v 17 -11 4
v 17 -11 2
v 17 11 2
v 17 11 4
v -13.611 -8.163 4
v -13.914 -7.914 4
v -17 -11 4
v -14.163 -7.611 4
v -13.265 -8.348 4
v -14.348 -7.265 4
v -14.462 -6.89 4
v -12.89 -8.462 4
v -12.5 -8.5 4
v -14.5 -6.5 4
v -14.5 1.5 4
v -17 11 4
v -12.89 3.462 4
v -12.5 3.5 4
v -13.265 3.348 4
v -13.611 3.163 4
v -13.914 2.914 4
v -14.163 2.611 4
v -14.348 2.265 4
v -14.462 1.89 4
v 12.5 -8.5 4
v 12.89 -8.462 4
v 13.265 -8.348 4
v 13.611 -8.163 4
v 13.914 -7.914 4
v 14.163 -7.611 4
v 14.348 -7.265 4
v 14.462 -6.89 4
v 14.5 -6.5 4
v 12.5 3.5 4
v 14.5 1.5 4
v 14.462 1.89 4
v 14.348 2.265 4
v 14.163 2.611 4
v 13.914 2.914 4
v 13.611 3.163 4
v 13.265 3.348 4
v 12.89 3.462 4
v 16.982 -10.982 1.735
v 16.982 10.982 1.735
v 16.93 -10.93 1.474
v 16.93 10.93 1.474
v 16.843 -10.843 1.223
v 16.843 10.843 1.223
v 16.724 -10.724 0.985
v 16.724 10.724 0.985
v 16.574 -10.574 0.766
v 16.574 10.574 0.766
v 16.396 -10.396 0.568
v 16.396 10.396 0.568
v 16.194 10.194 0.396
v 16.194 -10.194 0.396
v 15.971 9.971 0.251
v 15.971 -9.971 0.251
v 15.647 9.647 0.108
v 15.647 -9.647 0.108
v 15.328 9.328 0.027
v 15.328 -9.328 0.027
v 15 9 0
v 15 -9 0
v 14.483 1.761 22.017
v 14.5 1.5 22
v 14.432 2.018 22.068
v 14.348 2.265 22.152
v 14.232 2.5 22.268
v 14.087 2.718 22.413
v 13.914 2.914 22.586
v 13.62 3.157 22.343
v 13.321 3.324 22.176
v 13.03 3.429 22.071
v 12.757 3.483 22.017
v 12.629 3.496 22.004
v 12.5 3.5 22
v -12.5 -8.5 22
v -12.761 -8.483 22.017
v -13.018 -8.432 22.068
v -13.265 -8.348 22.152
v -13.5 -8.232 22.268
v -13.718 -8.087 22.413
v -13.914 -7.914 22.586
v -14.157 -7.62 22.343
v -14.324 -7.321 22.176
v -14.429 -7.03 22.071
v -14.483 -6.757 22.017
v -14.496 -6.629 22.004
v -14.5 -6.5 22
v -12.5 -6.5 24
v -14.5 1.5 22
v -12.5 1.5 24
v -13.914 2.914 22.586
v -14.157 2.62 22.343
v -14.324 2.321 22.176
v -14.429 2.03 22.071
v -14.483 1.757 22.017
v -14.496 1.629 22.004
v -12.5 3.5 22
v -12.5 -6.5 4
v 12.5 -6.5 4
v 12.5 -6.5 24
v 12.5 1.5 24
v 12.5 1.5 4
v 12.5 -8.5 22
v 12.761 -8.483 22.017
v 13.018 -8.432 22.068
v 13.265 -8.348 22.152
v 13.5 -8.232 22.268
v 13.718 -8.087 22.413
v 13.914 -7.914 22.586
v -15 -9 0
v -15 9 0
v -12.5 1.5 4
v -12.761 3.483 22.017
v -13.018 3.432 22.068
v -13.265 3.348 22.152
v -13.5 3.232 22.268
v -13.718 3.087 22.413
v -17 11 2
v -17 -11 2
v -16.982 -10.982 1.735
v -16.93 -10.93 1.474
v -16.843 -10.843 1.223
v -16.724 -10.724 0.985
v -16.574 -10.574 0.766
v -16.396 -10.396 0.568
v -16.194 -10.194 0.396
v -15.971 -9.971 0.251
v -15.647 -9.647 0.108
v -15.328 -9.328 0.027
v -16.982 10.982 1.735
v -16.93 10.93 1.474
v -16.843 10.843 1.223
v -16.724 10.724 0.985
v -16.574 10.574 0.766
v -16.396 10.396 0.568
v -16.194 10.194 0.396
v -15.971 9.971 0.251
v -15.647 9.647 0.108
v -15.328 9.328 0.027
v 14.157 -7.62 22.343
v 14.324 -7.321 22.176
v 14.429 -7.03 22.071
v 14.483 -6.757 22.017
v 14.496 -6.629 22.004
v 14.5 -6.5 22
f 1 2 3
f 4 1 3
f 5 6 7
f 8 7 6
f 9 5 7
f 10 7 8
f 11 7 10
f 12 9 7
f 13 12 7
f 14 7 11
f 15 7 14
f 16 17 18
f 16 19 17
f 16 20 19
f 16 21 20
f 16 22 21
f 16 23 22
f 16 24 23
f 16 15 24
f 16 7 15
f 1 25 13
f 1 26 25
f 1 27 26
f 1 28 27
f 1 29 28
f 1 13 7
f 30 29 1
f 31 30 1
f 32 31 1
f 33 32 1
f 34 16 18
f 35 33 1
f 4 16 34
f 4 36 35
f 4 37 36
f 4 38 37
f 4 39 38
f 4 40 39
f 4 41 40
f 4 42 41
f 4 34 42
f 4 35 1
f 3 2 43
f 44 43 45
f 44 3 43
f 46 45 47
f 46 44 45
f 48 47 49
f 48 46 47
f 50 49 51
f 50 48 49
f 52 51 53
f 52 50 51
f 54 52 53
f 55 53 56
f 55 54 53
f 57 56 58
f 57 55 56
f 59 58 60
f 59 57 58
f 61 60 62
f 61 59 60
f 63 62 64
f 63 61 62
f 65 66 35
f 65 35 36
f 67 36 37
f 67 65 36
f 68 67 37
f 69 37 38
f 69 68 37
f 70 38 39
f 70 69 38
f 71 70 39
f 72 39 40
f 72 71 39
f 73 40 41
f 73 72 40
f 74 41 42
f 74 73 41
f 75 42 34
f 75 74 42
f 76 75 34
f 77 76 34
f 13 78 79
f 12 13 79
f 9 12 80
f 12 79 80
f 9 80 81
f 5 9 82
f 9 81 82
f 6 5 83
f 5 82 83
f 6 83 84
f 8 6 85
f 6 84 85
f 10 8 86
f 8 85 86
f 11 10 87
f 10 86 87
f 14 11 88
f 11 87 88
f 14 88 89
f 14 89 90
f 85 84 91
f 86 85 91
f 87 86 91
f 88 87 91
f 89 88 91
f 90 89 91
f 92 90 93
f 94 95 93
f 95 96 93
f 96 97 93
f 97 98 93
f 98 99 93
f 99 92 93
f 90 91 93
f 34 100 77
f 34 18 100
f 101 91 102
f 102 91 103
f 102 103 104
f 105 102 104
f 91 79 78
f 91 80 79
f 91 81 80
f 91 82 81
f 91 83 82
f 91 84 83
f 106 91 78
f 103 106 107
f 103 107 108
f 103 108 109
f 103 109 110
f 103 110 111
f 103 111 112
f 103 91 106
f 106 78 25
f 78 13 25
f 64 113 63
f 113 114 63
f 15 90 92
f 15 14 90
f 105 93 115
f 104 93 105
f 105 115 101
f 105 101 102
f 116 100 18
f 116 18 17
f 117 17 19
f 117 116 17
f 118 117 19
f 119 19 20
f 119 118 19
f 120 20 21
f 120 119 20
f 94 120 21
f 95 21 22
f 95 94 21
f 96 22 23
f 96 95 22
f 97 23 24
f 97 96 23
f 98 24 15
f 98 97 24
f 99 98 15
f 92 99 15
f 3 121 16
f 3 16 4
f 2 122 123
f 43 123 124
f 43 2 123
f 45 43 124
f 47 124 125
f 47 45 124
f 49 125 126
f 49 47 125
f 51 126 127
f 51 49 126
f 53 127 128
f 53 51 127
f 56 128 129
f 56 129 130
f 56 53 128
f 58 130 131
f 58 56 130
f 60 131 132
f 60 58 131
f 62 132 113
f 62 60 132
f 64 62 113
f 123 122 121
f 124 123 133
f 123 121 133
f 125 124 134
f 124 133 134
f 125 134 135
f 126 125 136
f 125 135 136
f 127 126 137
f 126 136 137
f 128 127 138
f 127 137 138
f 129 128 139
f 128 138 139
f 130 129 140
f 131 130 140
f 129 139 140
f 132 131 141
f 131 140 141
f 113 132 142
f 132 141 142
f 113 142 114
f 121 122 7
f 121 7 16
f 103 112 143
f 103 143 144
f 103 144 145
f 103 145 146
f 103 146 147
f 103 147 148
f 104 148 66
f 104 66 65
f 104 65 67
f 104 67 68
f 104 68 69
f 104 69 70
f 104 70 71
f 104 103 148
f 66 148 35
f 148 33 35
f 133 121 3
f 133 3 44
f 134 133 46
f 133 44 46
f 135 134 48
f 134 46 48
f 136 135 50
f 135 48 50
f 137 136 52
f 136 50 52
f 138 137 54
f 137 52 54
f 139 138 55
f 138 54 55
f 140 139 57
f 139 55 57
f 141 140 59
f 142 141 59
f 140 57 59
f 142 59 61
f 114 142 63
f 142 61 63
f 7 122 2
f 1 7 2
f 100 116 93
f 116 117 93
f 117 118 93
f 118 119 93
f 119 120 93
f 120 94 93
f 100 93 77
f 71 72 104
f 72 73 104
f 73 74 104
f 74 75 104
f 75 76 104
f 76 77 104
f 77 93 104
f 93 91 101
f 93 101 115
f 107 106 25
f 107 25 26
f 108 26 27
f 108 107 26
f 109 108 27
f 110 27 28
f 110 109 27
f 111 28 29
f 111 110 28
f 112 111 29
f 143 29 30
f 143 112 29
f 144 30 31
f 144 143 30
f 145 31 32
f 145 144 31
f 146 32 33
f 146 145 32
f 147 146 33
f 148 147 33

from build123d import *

# Parameters (mm, degrees)
F0_W      = 34
F0_H      = 22
F1_DEPTH  = 4
F2_W      = 29
F2_H      = 12
F3_DEPTH  = 20
F4_SIZE   = 2
F3_FACE_W = 25
F3_FACE_H = 8
F5_DEPTH  = 20
F6_R      = 2
F7_R      = 2


with BuildPart() as f1:
    # F0 (on Top) → F1 (new body)
    with BuildSketch(Plane.XY):
        Rectangle(F0_W, F0_H)
    extrude(amount=F1_DEPTH)

    # F2 (on face) → F3 (join)
    with BuildSketch(Plane.XY.offset(4)):
        with Locations((0, -2.5)):
            Rectangle(F2_W, F2_H)
    extrude(amount=F3_DEPTH)

    # F4
    f4_edges = [f1.edges().sort_by_distance(p)[0] for p in [
        (0, 3.5, 24),
        (-14.5, -2.5, 24),
        (0, -8.5, 24),
        (14.5, -2.5, 24),
    ]]
    chamfer(f4_edges, length=F4_SIZE)

    # F3_face (on face) → F5 (cut)
    with BuildSketch(Plane(origin=(0, -2.5, 24), x_dir=(1, 0, 0), z_dir=(0, 0, 1))):
        Rectangle(F3_FACE_W, F3_FACE_H)
    extrude(amount=-F5_DEPTH, mode=Mode.SUBTRACT)

    # F6
    f6_edges = [f1.edges().sort_by_distance(p)[0] for p in [
        (0, -11, 0),
        (17, 0, 0),
        (-17, 0, 0),
        (0, 11, 0),
    ]]
    fillet(f6_edges, radius=F6_R)

    # F7
    f7_edges = [f1.edges().sort_by_distance(p)[0] for p in [
        (-14.5, -8.5, 13),
        (-14.5, 3.5, 13),
        (14.5, -8.5, 13),
        (14.5, 3.5, 13),
    ]]
    fillet(f7_edges, radius=F7_R)


solid = f1.part
